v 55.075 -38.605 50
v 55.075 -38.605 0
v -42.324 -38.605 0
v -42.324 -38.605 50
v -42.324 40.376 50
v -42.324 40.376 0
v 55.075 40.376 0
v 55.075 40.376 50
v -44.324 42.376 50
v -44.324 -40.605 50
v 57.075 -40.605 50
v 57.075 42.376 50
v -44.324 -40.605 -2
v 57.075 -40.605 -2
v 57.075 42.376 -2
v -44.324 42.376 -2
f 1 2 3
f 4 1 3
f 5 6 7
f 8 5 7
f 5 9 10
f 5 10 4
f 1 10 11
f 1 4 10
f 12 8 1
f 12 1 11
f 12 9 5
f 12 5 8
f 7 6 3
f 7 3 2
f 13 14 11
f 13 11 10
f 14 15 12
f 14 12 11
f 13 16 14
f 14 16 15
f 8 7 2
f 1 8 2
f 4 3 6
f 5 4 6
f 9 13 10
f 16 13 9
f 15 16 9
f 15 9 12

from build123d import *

# Parameters (mm, degrees)
SHEET_EXTRUDE_1_2_DEPTH = 50
SKETCH_1_2_W            = 97.399040294
SKETCH_1_2_H            = 78.98176722
THICKEN_1_T1            = 2


with BuildPart() as body_1:
    # Sheet Extrude 1: a surface, the sketch's curves swept straight by 50 mm
    with BuildLine(Plane.XY, mode=Mode.PRIVATE) as sheet_extrude_1_2_path:
        Line((-42.324310237, 40.376329431), (55.074730057, 40.376329431))
        Line((55.074730057, 40.376329431), (55.074730057, -38.605437789))
        Line((55.074730057, -38.605437789), (-42.324310237, -38.605437789))
        Line((-42.324310237, -38.605437789), (-42.324310237, 40.376329431))
    sheet_extrude_1_2 = Shell.extrude(sheet_extrude_1_2_path.wire(), (0 * SHEET_EXTRUDE_1_2_DEPTH, 0 * SHEET_EXTRUDE_1_2_DEPTH, 1 * SHEET_EXTRUDE_1_2_DEPTH))
    # Эскиз1<2> → Sheet Fill 1: a flat surface bounded by the sketch
    with BuildSketch(Plane.XY, mode=Mode.PRIVATE) as sheet_fill_1_3_region:
        with Locations((6.37520991, 0.885445821)):
            Rectangle(SKETCH_1_2_W, SKETCH_1_2_H)
    sheet_fill_1_3 = sheet_fill_1_3_region.sketch.faces()[0]
    # Knit 1: the surfaces knitted into one
    knit_1_1 = Shell(Face.sew_faces(sheet_extrude_1_2.faces() + sheet_fill_1_3.faces())[0])
    add(Solid.thicken(knit_1_1, THICKEN_1_T1))


solid = body_1.part
